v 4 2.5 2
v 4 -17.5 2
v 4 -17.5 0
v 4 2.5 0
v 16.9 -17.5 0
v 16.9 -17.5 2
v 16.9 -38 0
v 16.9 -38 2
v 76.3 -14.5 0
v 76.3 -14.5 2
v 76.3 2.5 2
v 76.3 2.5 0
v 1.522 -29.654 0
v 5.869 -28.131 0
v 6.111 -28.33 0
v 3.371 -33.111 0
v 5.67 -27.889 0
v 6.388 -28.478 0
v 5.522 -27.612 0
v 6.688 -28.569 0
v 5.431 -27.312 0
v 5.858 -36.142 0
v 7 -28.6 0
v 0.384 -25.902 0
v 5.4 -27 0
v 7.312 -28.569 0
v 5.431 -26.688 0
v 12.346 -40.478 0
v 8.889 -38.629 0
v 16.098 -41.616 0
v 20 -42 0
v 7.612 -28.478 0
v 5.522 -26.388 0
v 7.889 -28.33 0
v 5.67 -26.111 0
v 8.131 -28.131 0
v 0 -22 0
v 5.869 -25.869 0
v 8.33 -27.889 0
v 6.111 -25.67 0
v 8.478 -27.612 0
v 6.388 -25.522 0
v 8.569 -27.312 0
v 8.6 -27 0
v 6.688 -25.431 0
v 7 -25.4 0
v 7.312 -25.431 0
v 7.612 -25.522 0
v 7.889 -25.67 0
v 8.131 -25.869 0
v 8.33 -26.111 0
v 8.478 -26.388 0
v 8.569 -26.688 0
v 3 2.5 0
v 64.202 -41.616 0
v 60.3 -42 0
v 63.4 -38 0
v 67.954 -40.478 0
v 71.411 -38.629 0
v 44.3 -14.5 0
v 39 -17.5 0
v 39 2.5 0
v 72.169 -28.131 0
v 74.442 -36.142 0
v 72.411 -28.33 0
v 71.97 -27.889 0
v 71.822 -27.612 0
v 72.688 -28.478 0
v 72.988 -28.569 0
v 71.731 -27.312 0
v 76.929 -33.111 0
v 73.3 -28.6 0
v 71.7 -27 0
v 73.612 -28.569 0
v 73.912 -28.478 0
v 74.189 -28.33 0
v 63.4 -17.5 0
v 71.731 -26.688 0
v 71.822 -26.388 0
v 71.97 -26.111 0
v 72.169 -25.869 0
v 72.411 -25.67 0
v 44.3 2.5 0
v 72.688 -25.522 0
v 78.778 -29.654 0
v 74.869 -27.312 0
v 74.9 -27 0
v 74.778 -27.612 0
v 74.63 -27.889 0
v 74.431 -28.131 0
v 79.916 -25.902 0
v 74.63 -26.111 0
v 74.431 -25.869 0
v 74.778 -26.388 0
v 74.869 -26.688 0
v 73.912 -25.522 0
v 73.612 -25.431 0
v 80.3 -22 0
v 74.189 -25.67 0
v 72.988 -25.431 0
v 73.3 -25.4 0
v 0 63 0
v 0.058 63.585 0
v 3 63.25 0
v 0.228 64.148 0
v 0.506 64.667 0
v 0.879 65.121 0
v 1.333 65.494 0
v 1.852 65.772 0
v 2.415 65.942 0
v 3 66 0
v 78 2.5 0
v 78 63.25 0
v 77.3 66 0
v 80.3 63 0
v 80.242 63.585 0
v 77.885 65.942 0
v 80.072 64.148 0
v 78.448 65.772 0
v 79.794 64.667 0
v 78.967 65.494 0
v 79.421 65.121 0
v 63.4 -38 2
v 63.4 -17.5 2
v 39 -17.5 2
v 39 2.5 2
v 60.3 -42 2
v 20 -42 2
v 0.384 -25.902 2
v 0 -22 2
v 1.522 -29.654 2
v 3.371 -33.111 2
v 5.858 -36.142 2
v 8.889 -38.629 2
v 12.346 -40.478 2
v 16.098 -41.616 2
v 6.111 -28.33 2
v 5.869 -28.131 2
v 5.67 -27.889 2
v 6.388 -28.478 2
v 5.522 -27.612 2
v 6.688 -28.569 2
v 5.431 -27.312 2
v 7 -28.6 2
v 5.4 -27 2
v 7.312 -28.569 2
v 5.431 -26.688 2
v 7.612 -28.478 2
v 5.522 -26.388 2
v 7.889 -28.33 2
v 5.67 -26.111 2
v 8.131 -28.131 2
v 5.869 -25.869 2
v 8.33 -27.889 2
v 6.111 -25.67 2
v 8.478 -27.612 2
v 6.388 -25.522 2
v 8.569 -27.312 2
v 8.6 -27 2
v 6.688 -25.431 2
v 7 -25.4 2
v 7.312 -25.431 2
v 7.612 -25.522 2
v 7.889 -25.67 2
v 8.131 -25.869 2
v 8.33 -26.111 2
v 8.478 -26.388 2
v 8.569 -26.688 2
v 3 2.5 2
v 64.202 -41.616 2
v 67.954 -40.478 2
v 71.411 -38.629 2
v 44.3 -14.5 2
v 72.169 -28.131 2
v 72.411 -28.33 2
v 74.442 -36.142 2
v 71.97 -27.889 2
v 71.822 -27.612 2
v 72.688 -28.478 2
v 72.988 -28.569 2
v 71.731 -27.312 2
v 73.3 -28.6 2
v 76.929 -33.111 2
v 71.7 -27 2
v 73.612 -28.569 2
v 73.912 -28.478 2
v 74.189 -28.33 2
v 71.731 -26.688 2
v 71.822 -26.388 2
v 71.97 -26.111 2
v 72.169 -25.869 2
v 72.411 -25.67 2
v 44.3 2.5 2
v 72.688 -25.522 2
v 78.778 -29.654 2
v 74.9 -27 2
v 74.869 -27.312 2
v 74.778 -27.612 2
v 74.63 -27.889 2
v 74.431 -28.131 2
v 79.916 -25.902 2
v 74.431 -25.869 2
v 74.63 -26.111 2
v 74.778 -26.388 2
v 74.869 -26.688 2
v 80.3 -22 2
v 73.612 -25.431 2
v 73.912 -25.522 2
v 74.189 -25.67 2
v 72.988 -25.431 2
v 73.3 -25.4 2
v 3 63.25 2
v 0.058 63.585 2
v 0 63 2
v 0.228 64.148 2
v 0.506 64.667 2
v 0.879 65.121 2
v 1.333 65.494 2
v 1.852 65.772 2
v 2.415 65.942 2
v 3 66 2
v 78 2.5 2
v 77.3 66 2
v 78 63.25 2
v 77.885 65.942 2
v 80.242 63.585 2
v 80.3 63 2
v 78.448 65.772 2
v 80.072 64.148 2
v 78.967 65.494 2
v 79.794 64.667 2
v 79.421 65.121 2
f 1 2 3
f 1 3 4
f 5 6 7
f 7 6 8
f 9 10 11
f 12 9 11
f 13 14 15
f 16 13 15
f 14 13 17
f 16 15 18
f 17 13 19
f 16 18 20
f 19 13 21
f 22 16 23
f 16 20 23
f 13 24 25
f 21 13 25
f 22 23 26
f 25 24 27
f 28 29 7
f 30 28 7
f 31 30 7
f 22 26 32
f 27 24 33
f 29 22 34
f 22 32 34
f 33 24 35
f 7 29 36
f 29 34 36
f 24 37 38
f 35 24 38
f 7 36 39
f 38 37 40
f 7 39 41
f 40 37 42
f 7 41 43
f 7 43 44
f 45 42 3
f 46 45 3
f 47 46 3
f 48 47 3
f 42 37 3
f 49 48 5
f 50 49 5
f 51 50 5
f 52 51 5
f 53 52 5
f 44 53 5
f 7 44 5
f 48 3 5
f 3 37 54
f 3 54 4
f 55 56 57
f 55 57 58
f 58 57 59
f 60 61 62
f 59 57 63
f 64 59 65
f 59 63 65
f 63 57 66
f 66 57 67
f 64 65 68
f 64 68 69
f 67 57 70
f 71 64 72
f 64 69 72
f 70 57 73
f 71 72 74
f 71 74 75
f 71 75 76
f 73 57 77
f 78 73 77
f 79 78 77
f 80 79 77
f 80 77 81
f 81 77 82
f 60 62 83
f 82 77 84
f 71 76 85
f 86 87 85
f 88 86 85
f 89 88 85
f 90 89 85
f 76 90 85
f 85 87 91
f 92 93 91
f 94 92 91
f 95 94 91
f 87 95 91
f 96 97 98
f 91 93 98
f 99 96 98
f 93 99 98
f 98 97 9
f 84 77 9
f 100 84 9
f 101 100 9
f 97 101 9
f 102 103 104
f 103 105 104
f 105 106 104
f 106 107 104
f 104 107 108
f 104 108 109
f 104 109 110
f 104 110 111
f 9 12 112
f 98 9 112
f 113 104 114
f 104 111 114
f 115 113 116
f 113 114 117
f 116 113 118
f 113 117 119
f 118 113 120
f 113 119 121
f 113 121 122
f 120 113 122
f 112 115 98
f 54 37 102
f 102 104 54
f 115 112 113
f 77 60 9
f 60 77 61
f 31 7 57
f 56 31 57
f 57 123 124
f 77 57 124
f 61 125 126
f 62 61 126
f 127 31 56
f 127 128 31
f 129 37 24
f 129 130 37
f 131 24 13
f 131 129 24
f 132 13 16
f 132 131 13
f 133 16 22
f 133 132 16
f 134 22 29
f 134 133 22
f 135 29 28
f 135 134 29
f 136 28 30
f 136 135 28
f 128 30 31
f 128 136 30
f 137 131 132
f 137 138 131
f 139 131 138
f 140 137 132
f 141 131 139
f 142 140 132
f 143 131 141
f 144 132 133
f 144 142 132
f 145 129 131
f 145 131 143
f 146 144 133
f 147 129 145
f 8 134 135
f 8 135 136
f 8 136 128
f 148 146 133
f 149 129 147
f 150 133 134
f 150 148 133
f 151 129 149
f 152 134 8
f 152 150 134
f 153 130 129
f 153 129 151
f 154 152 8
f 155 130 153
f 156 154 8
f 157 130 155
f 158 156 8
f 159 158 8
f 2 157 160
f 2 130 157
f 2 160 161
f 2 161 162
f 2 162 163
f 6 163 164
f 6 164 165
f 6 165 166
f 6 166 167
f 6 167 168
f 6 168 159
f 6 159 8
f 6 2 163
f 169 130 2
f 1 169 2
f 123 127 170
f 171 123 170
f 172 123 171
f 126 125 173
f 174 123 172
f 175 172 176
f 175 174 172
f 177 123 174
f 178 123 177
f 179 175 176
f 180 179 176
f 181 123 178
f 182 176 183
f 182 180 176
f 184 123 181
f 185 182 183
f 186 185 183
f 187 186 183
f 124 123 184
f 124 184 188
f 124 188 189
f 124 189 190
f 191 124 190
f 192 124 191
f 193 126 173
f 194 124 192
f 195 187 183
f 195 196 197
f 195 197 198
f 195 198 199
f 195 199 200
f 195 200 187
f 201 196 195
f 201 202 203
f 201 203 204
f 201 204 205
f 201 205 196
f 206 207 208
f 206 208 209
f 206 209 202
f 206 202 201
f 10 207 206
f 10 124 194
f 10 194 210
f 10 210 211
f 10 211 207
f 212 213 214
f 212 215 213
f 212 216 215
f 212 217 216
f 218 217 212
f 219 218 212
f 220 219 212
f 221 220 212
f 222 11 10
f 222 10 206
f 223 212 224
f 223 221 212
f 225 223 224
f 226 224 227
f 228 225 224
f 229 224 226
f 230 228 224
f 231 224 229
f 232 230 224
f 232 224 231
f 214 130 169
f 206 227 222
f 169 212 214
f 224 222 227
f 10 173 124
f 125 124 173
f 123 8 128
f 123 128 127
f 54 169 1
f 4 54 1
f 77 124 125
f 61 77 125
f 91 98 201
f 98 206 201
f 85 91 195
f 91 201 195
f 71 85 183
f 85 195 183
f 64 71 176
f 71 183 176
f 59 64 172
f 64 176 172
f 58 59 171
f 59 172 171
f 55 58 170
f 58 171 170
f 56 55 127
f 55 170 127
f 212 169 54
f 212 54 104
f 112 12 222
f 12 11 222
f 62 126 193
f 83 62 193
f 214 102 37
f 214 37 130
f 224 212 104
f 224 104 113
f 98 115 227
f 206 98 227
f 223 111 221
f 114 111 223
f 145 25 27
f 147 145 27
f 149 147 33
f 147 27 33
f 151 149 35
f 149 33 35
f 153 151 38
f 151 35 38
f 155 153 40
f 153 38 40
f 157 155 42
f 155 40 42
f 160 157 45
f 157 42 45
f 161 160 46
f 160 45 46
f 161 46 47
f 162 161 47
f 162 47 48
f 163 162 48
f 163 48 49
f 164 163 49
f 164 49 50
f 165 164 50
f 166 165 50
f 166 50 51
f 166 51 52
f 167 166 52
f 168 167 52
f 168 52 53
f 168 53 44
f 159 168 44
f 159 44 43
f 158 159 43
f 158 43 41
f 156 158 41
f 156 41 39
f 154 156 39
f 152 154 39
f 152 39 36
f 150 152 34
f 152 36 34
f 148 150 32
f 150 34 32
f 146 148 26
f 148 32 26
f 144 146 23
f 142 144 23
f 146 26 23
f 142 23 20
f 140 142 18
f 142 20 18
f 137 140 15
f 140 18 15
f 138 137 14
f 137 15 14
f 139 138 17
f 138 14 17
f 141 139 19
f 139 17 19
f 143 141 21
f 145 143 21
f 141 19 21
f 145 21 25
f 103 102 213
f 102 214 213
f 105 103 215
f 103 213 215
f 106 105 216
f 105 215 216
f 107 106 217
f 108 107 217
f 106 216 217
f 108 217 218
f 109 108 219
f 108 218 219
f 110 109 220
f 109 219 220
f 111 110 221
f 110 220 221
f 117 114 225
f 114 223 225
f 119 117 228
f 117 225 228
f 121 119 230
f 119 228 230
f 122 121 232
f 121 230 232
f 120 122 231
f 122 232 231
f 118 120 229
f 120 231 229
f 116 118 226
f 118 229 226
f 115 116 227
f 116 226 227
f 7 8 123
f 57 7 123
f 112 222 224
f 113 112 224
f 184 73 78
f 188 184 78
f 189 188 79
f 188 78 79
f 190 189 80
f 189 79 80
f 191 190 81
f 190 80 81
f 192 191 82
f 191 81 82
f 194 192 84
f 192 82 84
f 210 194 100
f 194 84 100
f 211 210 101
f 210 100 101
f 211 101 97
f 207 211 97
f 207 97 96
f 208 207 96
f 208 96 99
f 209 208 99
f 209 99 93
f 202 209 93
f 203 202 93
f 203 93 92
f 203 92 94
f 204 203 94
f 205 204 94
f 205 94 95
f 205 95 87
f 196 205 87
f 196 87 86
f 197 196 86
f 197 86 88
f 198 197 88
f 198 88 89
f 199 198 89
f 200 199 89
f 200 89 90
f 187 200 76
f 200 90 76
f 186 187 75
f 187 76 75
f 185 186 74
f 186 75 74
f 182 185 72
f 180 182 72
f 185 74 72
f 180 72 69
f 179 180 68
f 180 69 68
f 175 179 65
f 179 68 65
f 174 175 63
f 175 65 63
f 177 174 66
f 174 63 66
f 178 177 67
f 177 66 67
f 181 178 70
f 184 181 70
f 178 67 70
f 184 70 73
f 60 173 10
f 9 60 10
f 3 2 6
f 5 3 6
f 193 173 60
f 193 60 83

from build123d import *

# Parameters (mm, degrees)
SKETCH1_W                      = 80.3
SKETCH1_H                      = 66
BOSS_EXTRUDE1_DEPTH            = 2
F_3_2_3_2_DIAMETER_HOLE1_D     = 3.2
FILLET1_R                      = 3
SKETCH4_W                      = 80.3
SKETCH4_H                      = 2
BOSS_EXTRUDE2_DEPTH            = 42
FILLET2_R                      = 20
F_3_2_3_2_DIAMETER_HOLE2_D     = 3.2
F_3_2_3_2_DIAMETER_HOLE2_DEPTH = 60
F_3_2_3_2_DIAMETER_HOLE2_TIP   = 0.96137699
SKETCH7_W                      = 75
SKETCH7_H                      = 60.5
CUT_EXTRUDE1_DEPTH             = 3
SKETCH10_W                     = 35
SKETCH10_H                     = 20
SKETCH10_W_2                   = 32
SKETCH10_H_2                   = 17
CUT_EXTRUDE3_DEPTH             = 3
SKETCH11_W                     = 75
SKETCH11_H                     = 0.25
CUT_EXTRUDE4_DEPTH             = 3


with BuildPart() as part:
    # Sketch1 → Boss-Extrude1 (new body)
    with BuildSketch(Plane.XY):
        with Locations((40.15, 33)):
            Rectangle(SKETCH1_W, SKETCH1_H)
    extrude(amount=BOSS_EXTRUDE1_DEPTH)

    # Ø3.2 (3.2) Diameter Hole1 (through all)
    with Locations(Plane.XY.offset(2)):
        with Locations((7, 59), (73.3, 59), (73.3, 7), (7, 7)):
            Hole(F_3_2_3_2_DIAMETER_HOLE1_D / 2)

    # Fillet1
    fillet1_edges = [part.edges().sort_by_distance(p)[0] for p in [
        (0, 66, 1),
        (80.3, 66, 1),
    ]]
    fillet(fillet1_edges, radius=FILLET1_R)

    # Sketch4 → Boss-Extrude2 (add)
    with BuildSketch(Plane.XZ):
        with Locations((40.15, 1)):
            Rectangle(SKETCH4_W, SKETCH4_H)
    extrude(amount=BOSS_EXTRUDE2_DEPTH)

    # Fillet2
    fillet2_edges = [part.edges().sort_by_distance(p)[0] for p in [
        (0, -42, 1),
        (80.3, -42, 1),
    ]]
    fillet(fillet2_edges, radius=FILLET2_R)

    # Ø3.2 (3.2) Diameter Hole2
    with Locations(Plane.XY.offset(2)):
        with Locations((7, -27), (73.3, -27)):
            Hole(F_3_2_3_2_DIAMETER_HOLE2_D / 2, depth=F_3_2_3_2_DIAMETER_HOLE2_DEPTH)
            with Locations((0, 0, -(F_3_2_3_2_DIAMETER_HOLE2_DEPTH + F_3_2_3_2_DIAMETER_HOLE2_TIP / 2))):  # 118° drill point
                Cone(0, F_3_2_3_2_DIAMETER_HOLE2_D / 2, F_3_2_3_2_DIAMETER_HOLE2_TIP, mode=Mode.SUBTRACT)

    # Sketch7 → Cut-Extrude1 (cut, through all)
    with BuildSketch(Plane.XY.offset(2)):
        with Locations((40.5, 33)):
            Rectangle(SKETCH7_W, SKETCH7_H)
    extrude(amount=-CUT_EXTRUDE1_DEPTH, mode=Mode.SUBTRACT)

    # Sketch10 → Cut-Extrude3 (cut, through all)
    with BuildSketch(Plane.XY.offset(2)):
        with Locations((21.5, -7.5)):
            Rectangle(SKETCH10_W, SKETCH10_H)
        Polygon((63.4, -17.5), (39, -17.5), (16.9, -17.5), (16.9, -38), (63.4, -38), align=None)
        with Locations((60.3, -6)):
            Rectangle(SKETCH10_W_2, SKETCH10_H_2)
    extrude(amount=-CUT_EXTRUDE3_DEPTH, mode=Mode.SUBTRACT)

    # Sketch11 → Cut-Extrude4 (cut, through all)
    with BuildSketch(Plane.XY.offset(2)):
        with Locations((40.5, 2.625)):
            Rectangle(SKETCH11_W, SKETCH11_H)
    extrude(amount=-CUT_EXTRUDE4_DEPTH, mode=Mode.SUBTRACT)


solid = part.part
